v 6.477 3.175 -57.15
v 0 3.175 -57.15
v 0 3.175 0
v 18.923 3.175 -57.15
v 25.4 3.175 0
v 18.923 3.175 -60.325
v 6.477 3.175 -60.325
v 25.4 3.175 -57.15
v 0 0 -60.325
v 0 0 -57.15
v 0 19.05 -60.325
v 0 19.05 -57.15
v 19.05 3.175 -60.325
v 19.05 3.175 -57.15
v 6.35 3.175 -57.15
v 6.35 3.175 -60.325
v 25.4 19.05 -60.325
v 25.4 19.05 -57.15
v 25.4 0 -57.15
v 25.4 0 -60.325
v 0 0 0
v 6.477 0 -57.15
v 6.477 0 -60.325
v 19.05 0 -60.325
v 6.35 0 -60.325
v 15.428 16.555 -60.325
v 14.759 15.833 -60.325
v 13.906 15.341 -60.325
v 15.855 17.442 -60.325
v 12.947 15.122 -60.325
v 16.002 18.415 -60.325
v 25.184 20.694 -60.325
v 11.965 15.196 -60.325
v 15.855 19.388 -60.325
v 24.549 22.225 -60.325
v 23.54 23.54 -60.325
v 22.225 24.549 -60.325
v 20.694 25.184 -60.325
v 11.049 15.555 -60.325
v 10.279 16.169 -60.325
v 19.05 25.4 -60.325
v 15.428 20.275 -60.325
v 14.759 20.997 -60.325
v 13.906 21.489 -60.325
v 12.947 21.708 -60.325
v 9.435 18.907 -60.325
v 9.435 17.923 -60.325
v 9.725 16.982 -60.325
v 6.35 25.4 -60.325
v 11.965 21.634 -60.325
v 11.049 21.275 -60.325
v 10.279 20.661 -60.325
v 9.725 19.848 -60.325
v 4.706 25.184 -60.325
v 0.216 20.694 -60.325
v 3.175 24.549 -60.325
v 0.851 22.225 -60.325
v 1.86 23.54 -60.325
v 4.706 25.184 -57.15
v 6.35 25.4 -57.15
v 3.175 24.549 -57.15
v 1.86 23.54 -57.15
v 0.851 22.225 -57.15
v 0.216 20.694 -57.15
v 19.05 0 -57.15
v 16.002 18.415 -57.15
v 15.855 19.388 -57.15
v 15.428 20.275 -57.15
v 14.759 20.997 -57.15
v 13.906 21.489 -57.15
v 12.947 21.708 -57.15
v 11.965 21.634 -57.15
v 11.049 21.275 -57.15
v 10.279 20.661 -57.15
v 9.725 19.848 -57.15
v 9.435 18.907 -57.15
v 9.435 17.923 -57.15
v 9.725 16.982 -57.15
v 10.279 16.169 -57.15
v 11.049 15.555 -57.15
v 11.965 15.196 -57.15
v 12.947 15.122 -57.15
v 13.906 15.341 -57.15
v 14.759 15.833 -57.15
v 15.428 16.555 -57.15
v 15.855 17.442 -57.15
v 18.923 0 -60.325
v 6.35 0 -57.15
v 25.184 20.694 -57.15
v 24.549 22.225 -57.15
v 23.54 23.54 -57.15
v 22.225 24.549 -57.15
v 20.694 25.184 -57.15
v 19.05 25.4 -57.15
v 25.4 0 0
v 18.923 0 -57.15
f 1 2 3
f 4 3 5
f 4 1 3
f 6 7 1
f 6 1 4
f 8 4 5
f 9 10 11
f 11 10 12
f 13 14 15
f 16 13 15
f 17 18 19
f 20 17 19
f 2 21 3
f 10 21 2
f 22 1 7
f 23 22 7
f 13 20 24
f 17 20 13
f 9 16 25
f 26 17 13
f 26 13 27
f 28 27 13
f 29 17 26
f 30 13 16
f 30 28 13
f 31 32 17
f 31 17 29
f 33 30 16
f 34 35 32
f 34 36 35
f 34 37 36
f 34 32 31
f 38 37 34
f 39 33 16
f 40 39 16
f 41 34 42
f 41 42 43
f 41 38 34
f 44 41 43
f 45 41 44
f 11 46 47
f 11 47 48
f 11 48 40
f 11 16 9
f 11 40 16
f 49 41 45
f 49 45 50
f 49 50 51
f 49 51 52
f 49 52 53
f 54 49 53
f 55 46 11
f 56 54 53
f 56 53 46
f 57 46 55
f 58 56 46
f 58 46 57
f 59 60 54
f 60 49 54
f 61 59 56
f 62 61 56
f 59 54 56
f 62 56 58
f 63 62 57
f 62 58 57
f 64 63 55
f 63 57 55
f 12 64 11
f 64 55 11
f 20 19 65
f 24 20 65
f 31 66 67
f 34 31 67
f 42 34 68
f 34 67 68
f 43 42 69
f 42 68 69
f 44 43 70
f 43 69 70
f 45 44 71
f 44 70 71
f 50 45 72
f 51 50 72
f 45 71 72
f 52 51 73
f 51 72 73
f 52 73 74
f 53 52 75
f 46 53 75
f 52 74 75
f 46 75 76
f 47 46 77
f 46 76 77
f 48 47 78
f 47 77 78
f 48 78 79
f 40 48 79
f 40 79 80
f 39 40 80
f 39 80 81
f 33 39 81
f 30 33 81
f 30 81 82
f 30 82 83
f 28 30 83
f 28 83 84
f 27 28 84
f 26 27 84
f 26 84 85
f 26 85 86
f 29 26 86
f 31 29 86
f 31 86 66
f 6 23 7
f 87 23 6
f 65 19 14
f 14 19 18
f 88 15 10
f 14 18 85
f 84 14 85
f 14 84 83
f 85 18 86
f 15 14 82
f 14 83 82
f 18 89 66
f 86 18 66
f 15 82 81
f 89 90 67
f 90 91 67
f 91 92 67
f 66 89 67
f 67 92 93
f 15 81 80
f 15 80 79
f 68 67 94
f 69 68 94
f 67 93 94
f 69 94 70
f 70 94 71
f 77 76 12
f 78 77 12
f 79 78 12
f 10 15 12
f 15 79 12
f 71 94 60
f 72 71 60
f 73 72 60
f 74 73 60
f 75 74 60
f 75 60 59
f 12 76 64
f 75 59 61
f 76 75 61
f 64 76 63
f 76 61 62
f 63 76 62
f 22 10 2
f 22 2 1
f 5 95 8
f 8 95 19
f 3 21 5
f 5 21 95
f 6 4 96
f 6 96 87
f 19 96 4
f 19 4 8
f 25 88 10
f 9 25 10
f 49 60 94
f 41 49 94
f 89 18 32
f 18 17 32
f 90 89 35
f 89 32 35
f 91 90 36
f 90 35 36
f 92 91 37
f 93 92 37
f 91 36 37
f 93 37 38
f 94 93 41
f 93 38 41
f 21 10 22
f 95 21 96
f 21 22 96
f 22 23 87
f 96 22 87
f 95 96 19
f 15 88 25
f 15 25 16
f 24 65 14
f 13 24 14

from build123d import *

# Parameters (mm, degrees)
SKETCH1_W           = 25.4
SKETCH1_H           = 57.15
SKETCH1_W_2         = 12.446
SKETCH1_H_2         = 3.175
BOSS_EXTRUDE1_DEPTH = 3.175
SKETCH2_W           = 6.35
SKETCH2_H           = 3.175
BOSS_EXTRUDE2_DEPTH = 3.175
SKETCH3_R           = 3.302
CUT_EXTRUDE1_DEPTH  = 68.501425911
FILLET1_R           = 6.35


with BuildPart() as part:
    # Sketch1 → Boss-Extrude1 (new body)
    with BuildSketch(Plane(origin=(0, 0, 0), x_dir=(1, 0, 0), z_dir=(0, 1, 0))):
        with Locations((12.7, 28.575)):
            Rectangle(SKETCH1_W, SKETCH1_H)
        with Locations((12.7, 58.7375)):
            Rectangle(SKETCH1_W_2, SKETCH1_H_2)
    extrude(amount=BOSS_EXTRUDE1_DEPTH)


with BuildPart() as body_2:
    # Sketch2 → Boss-Extrude2 (new body)
    with BuildSketch(Plane(origin=(0, 0, -57.15), x_dir=(-1, 0, 0), z_dir=(0, 0, -1))):
        Polygon((-25.4, 0), (-19.05, 0), (-19.05, 3.175), (-6.477, 3.175), (-6.35, 3.175), (0, 3.175), (0, 25.4), (-25.4, 25.4), align=None)
        with Locations((-3.175, 1.5875)):
            Rectangle(SKETCH2_W, SKETCH2_H)
    extrude(amount=BOSS_EXTRUDE2_DEPTH)

    # Sketch3 → Cut-Extrude1 (cut, through all)
    with BuildSketch(Plane.XY.offset(-57.15)):
        with Locations((12.7, 18.415)):
            Circle(SKETCH3_R)
    extrude(amount=-CUT_EXTRUDE1_DEPTH, mode=Mode.SUBTRACT)

    # Fillet1
    fillet1_edges = [body_2.edges().sort_by_distance(p)[0] for p in [
        (25.4, 25.4, -58.7375),
        (0, 25.4, -58.7375),
    ]]
    fillet(fillet1_edges, radius=FILLET1_R)


solid = Compound([part.part, body_2.part])
